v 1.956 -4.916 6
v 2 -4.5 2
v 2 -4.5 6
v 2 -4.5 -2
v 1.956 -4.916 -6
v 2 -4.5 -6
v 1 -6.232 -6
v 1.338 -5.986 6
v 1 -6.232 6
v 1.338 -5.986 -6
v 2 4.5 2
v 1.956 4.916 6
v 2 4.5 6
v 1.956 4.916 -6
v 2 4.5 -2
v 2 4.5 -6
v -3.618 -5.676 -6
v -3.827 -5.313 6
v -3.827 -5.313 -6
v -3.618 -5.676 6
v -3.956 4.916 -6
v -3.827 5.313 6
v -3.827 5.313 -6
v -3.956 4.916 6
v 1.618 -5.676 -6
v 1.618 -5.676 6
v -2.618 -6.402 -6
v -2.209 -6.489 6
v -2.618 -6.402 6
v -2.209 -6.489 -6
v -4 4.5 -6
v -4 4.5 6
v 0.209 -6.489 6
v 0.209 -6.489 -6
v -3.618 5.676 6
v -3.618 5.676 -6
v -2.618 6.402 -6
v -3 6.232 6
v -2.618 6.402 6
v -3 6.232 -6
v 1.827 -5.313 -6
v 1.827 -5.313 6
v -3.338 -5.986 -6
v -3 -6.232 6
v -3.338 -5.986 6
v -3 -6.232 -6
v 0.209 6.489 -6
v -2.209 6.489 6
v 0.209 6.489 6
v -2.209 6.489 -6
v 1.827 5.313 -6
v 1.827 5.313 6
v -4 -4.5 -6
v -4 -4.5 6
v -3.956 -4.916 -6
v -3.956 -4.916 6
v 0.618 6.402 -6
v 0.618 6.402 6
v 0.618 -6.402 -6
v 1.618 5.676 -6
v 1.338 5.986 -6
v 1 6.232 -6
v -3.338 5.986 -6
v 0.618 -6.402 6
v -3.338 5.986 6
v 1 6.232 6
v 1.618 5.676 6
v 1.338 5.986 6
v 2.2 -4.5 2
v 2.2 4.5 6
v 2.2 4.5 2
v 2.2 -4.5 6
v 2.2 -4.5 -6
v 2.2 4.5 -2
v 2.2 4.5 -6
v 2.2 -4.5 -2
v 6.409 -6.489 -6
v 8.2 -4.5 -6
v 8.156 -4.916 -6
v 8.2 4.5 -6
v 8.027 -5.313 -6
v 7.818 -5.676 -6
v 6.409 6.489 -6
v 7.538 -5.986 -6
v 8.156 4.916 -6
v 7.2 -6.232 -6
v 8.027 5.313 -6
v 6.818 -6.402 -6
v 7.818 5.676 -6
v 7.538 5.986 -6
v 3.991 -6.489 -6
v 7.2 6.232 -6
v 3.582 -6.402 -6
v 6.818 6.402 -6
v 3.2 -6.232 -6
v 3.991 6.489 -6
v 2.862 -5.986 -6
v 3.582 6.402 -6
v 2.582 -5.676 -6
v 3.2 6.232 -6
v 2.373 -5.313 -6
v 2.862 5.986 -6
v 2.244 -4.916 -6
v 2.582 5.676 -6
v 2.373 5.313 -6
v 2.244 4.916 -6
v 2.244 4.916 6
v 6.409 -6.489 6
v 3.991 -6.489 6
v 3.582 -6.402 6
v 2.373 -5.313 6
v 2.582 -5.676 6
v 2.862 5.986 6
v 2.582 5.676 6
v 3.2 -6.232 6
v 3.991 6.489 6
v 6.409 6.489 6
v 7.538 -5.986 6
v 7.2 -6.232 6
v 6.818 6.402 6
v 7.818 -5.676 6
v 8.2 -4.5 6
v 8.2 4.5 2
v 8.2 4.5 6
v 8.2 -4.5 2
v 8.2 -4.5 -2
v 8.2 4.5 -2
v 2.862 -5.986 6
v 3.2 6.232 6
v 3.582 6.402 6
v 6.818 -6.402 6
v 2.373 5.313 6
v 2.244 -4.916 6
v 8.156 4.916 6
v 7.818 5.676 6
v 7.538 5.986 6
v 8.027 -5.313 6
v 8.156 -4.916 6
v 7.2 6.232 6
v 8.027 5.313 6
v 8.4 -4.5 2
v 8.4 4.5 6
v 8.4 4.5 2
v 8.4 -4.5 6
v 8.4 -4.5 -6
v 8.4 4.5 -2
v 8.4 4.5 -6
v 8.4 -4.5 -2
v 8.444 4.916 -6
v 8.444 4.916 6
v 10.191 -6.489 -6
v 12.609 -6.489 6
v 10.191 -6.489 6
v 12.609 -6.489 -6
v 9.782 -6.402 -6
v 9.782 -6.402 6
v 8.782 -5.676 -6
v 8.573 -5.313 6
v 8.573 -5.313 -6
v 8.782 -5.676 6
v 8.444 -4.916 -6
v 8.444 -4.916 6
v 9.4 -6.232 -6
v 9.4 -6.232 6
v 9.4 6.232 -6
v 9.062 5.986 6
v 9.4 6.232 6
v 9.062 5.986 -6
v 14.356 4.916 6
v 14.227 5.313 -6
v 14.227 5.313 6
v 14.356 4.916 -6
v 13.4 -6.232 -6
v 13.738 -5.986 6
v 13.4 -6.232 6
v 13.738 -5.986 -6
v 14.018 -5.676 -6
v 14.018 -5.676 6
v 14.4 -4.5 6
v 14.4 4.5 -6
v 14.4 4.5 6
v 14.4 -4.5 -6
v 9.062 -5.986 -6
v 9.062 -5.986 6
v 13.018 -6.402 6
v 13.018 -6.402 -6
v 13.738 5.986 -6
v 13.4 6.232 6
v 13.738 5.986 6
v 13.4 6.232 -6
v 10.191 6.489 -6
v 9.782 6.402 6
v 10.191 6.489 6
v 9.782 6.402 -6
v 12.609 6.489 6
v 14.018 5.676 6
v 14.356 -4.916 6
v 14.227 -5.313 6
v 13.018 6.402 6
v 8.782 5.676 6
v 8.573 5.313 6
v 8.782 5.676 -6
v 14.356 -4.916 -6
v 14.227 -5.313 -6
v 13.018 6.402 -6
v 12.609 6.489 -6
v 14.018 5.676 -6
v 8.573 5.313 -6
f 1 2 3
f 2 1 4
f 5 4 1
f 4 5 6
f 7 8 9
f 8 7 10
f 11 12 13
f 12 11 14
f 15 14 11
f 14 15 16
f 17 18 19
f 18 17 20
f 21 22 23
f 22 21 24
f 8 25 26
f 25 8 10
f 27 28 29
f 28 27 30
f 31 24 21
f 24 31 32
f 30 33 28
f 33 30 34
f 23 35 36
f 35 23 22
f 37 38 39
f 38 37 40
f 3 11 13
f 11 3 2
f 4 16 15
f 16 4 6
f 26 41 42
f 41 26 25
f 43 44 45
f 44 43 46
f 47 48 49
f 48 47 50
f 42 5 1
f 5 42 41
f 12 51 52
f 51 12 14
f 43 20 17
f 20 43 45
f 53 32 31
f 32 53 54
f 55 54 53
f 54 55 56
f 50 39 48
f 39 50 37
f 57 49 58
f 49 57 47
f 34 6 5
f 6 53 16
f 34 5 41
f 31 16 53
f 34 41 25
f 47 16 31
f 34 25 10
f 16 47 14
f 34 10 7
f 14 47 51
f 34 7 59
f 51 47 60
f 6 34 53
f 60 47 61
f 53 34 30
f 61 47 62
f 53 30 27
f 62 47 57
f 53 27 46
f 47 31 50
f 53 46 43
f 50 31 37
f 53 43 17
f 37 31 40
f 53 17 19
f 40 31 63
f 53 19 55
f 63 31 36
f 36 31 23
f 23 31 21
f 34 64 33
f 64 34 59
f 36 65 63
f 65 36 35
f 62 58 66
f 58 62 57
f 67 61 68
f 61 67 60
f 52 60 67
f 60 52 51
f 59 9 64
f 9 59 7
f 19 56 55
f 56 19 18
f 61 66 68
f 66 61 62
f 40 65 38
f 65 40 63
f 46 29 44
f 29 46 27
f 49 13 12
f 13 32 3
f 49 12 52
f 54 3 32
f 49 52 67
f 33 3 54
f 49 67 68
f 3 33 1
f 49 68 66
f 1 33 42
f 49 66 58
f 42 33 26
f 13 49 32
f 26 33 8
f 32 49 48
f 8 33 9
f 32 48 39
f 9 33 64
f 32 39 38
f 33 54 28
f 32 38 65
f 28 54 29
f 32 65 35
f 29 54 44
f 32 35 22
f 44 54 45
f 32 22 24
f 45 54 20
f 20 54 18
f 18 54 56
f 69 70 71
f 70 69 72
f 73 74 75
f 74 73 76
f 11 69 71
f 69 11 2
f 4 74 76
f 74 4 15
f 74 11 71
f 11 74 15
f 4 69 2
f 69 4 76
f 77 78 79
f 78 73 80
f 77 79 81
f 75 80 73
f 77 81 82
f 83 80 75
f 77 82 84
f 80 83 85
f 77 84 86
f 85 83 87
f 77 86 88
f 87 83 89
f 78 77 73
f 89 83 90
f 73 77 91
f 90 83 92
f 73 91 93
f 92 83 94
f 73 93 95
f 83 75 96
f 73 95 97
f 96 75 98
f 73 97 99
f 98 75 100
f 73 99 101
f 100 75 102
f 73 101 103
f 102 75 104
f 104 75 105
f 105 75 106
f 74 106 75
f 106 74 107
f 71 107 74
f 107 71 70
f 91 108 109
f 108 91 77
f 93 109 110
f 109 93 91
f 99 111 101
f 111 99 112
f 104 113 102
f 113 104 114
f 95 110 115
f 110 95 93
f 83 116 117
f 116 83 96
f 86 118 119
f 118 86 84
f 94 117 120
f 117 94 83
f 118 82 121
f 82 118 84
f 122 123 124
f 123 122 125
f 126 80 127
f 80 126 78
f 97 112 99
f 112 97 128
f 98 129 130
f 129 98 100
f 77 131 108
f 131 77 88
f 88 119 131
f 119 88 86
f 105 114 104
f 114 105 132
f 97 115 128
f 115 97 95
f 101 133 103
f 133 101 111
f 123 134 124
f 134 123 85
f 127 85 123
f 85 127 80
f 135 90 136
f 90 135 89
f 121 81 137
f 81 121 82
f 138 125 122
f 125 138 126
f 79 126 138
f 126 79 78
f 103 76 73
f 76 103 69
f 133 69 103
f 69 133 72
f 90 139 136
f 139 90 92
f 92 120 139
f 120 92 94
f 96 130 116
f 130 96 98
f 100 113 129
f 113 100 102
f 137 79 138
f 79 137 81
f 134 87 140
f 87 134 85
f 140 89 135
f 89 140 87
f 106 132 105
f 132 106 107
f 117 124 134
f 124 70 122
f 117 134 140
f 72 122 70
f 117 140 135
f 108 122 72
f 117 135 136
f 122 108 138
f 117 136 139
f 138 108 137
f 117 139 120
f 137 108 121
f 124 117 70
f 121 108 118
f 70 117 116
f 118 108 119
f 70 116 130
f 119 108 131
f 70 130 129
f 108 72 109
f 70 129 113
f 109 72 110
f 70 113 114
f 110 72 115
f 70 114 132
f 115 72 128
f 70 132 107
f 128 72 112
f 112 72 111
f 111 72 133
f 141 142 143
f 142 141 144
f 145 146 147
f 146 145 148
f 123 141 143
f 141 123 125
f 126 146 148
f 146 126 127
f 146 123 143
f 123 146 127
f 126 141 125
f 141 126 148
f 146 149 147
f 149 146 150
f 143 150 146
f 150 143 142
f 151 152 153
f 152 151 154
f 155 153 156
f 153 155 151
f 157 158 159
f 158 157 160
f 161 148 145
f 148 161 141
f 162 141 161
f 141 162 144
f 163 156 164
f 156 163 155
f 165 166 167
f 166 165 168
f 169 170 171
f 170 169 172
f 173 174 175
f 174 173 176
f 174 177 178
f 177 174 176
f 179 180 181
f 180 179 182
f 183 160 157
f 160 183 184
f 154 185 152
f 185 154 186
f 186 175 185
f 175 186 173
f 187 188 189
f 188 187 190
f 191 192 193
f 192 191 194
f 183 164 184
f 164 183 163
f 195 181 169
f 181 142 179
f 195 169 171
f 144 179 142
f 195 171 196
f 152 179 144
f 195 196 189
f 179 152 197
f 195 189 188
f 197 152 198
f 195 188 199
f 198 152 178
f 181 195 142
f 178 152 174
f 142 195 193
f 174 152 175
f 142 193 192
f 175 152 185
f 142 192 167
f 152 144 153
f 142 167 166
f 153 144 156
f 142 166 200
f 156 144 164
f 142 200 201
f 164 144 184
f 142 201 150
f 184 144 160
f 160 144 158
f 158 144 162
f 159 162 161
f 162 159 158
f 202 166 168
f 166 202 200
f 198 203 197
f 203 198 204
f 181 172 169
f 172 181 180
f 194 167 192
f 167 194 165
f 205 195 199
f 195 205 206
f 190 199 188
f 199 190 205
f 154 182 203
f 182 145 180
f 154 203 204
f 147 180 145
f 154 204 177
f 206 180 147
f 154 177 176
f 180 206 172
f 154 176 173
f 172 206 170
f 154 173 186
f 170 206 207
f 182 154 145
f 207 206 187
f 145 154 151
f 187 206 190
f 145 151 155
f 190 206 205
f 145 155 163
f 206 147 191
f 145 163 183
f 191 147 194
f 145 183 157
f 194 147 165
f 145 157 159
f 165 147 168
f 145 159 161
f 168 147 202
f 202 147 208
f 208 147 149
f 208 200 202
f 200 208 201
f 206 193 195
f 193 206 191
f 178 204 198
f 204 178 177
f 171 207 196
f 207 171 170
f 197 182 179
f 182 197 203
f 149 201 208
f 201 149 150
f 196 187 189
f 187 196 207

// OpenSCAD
$fn=30;
height=12;
radius=2;
union(){
    hull(){
        translate([0,-4.5,0])cylinder(r=radius,h=height, center=true);
        translate([-2,4.5,0])cylinder(r=radius,h=height, center=true);
        translate([0,4.5,0])cylinder(r=radius,h=height, center=true);
        translate([-2,-4.5,0])cylinder(r=radius,h=height, center=true);
  }
  translate([2.1,0,0])cube([radius/10,radius+7,radius+2],center=true);
   translate([6.2,0,0]) hull(){
        translate([0,-4.5,0])cylinder(r=radius,h=height, center=true);
        translate([-2,4.5,0])cylinder(r=radius,h=height, center=true);
        translate([0,4.5,0])cylinder(r=radius,h=height, center=true);
        translate([-2,-4.5,0])cylinder(r=radius,h=height, center=true);
  }
  translate([8.3,0,0])cube([radius/10,radius+7,radius+2],center=true);
   translate([12.4,0,0]) hull(){
        translate([0,-4.5,0])cylinder(r=radius,h=height, center=true);
        translate([-2,4.5,0])cylinder(r=radius,h=height, center=true);
        translate([0,4.5,0])cylinder(r=radius,h=height, center=true);
        translate([-2,-4.5,0])cylinder(r=radius,h=height, center=true);
  }
}
  
